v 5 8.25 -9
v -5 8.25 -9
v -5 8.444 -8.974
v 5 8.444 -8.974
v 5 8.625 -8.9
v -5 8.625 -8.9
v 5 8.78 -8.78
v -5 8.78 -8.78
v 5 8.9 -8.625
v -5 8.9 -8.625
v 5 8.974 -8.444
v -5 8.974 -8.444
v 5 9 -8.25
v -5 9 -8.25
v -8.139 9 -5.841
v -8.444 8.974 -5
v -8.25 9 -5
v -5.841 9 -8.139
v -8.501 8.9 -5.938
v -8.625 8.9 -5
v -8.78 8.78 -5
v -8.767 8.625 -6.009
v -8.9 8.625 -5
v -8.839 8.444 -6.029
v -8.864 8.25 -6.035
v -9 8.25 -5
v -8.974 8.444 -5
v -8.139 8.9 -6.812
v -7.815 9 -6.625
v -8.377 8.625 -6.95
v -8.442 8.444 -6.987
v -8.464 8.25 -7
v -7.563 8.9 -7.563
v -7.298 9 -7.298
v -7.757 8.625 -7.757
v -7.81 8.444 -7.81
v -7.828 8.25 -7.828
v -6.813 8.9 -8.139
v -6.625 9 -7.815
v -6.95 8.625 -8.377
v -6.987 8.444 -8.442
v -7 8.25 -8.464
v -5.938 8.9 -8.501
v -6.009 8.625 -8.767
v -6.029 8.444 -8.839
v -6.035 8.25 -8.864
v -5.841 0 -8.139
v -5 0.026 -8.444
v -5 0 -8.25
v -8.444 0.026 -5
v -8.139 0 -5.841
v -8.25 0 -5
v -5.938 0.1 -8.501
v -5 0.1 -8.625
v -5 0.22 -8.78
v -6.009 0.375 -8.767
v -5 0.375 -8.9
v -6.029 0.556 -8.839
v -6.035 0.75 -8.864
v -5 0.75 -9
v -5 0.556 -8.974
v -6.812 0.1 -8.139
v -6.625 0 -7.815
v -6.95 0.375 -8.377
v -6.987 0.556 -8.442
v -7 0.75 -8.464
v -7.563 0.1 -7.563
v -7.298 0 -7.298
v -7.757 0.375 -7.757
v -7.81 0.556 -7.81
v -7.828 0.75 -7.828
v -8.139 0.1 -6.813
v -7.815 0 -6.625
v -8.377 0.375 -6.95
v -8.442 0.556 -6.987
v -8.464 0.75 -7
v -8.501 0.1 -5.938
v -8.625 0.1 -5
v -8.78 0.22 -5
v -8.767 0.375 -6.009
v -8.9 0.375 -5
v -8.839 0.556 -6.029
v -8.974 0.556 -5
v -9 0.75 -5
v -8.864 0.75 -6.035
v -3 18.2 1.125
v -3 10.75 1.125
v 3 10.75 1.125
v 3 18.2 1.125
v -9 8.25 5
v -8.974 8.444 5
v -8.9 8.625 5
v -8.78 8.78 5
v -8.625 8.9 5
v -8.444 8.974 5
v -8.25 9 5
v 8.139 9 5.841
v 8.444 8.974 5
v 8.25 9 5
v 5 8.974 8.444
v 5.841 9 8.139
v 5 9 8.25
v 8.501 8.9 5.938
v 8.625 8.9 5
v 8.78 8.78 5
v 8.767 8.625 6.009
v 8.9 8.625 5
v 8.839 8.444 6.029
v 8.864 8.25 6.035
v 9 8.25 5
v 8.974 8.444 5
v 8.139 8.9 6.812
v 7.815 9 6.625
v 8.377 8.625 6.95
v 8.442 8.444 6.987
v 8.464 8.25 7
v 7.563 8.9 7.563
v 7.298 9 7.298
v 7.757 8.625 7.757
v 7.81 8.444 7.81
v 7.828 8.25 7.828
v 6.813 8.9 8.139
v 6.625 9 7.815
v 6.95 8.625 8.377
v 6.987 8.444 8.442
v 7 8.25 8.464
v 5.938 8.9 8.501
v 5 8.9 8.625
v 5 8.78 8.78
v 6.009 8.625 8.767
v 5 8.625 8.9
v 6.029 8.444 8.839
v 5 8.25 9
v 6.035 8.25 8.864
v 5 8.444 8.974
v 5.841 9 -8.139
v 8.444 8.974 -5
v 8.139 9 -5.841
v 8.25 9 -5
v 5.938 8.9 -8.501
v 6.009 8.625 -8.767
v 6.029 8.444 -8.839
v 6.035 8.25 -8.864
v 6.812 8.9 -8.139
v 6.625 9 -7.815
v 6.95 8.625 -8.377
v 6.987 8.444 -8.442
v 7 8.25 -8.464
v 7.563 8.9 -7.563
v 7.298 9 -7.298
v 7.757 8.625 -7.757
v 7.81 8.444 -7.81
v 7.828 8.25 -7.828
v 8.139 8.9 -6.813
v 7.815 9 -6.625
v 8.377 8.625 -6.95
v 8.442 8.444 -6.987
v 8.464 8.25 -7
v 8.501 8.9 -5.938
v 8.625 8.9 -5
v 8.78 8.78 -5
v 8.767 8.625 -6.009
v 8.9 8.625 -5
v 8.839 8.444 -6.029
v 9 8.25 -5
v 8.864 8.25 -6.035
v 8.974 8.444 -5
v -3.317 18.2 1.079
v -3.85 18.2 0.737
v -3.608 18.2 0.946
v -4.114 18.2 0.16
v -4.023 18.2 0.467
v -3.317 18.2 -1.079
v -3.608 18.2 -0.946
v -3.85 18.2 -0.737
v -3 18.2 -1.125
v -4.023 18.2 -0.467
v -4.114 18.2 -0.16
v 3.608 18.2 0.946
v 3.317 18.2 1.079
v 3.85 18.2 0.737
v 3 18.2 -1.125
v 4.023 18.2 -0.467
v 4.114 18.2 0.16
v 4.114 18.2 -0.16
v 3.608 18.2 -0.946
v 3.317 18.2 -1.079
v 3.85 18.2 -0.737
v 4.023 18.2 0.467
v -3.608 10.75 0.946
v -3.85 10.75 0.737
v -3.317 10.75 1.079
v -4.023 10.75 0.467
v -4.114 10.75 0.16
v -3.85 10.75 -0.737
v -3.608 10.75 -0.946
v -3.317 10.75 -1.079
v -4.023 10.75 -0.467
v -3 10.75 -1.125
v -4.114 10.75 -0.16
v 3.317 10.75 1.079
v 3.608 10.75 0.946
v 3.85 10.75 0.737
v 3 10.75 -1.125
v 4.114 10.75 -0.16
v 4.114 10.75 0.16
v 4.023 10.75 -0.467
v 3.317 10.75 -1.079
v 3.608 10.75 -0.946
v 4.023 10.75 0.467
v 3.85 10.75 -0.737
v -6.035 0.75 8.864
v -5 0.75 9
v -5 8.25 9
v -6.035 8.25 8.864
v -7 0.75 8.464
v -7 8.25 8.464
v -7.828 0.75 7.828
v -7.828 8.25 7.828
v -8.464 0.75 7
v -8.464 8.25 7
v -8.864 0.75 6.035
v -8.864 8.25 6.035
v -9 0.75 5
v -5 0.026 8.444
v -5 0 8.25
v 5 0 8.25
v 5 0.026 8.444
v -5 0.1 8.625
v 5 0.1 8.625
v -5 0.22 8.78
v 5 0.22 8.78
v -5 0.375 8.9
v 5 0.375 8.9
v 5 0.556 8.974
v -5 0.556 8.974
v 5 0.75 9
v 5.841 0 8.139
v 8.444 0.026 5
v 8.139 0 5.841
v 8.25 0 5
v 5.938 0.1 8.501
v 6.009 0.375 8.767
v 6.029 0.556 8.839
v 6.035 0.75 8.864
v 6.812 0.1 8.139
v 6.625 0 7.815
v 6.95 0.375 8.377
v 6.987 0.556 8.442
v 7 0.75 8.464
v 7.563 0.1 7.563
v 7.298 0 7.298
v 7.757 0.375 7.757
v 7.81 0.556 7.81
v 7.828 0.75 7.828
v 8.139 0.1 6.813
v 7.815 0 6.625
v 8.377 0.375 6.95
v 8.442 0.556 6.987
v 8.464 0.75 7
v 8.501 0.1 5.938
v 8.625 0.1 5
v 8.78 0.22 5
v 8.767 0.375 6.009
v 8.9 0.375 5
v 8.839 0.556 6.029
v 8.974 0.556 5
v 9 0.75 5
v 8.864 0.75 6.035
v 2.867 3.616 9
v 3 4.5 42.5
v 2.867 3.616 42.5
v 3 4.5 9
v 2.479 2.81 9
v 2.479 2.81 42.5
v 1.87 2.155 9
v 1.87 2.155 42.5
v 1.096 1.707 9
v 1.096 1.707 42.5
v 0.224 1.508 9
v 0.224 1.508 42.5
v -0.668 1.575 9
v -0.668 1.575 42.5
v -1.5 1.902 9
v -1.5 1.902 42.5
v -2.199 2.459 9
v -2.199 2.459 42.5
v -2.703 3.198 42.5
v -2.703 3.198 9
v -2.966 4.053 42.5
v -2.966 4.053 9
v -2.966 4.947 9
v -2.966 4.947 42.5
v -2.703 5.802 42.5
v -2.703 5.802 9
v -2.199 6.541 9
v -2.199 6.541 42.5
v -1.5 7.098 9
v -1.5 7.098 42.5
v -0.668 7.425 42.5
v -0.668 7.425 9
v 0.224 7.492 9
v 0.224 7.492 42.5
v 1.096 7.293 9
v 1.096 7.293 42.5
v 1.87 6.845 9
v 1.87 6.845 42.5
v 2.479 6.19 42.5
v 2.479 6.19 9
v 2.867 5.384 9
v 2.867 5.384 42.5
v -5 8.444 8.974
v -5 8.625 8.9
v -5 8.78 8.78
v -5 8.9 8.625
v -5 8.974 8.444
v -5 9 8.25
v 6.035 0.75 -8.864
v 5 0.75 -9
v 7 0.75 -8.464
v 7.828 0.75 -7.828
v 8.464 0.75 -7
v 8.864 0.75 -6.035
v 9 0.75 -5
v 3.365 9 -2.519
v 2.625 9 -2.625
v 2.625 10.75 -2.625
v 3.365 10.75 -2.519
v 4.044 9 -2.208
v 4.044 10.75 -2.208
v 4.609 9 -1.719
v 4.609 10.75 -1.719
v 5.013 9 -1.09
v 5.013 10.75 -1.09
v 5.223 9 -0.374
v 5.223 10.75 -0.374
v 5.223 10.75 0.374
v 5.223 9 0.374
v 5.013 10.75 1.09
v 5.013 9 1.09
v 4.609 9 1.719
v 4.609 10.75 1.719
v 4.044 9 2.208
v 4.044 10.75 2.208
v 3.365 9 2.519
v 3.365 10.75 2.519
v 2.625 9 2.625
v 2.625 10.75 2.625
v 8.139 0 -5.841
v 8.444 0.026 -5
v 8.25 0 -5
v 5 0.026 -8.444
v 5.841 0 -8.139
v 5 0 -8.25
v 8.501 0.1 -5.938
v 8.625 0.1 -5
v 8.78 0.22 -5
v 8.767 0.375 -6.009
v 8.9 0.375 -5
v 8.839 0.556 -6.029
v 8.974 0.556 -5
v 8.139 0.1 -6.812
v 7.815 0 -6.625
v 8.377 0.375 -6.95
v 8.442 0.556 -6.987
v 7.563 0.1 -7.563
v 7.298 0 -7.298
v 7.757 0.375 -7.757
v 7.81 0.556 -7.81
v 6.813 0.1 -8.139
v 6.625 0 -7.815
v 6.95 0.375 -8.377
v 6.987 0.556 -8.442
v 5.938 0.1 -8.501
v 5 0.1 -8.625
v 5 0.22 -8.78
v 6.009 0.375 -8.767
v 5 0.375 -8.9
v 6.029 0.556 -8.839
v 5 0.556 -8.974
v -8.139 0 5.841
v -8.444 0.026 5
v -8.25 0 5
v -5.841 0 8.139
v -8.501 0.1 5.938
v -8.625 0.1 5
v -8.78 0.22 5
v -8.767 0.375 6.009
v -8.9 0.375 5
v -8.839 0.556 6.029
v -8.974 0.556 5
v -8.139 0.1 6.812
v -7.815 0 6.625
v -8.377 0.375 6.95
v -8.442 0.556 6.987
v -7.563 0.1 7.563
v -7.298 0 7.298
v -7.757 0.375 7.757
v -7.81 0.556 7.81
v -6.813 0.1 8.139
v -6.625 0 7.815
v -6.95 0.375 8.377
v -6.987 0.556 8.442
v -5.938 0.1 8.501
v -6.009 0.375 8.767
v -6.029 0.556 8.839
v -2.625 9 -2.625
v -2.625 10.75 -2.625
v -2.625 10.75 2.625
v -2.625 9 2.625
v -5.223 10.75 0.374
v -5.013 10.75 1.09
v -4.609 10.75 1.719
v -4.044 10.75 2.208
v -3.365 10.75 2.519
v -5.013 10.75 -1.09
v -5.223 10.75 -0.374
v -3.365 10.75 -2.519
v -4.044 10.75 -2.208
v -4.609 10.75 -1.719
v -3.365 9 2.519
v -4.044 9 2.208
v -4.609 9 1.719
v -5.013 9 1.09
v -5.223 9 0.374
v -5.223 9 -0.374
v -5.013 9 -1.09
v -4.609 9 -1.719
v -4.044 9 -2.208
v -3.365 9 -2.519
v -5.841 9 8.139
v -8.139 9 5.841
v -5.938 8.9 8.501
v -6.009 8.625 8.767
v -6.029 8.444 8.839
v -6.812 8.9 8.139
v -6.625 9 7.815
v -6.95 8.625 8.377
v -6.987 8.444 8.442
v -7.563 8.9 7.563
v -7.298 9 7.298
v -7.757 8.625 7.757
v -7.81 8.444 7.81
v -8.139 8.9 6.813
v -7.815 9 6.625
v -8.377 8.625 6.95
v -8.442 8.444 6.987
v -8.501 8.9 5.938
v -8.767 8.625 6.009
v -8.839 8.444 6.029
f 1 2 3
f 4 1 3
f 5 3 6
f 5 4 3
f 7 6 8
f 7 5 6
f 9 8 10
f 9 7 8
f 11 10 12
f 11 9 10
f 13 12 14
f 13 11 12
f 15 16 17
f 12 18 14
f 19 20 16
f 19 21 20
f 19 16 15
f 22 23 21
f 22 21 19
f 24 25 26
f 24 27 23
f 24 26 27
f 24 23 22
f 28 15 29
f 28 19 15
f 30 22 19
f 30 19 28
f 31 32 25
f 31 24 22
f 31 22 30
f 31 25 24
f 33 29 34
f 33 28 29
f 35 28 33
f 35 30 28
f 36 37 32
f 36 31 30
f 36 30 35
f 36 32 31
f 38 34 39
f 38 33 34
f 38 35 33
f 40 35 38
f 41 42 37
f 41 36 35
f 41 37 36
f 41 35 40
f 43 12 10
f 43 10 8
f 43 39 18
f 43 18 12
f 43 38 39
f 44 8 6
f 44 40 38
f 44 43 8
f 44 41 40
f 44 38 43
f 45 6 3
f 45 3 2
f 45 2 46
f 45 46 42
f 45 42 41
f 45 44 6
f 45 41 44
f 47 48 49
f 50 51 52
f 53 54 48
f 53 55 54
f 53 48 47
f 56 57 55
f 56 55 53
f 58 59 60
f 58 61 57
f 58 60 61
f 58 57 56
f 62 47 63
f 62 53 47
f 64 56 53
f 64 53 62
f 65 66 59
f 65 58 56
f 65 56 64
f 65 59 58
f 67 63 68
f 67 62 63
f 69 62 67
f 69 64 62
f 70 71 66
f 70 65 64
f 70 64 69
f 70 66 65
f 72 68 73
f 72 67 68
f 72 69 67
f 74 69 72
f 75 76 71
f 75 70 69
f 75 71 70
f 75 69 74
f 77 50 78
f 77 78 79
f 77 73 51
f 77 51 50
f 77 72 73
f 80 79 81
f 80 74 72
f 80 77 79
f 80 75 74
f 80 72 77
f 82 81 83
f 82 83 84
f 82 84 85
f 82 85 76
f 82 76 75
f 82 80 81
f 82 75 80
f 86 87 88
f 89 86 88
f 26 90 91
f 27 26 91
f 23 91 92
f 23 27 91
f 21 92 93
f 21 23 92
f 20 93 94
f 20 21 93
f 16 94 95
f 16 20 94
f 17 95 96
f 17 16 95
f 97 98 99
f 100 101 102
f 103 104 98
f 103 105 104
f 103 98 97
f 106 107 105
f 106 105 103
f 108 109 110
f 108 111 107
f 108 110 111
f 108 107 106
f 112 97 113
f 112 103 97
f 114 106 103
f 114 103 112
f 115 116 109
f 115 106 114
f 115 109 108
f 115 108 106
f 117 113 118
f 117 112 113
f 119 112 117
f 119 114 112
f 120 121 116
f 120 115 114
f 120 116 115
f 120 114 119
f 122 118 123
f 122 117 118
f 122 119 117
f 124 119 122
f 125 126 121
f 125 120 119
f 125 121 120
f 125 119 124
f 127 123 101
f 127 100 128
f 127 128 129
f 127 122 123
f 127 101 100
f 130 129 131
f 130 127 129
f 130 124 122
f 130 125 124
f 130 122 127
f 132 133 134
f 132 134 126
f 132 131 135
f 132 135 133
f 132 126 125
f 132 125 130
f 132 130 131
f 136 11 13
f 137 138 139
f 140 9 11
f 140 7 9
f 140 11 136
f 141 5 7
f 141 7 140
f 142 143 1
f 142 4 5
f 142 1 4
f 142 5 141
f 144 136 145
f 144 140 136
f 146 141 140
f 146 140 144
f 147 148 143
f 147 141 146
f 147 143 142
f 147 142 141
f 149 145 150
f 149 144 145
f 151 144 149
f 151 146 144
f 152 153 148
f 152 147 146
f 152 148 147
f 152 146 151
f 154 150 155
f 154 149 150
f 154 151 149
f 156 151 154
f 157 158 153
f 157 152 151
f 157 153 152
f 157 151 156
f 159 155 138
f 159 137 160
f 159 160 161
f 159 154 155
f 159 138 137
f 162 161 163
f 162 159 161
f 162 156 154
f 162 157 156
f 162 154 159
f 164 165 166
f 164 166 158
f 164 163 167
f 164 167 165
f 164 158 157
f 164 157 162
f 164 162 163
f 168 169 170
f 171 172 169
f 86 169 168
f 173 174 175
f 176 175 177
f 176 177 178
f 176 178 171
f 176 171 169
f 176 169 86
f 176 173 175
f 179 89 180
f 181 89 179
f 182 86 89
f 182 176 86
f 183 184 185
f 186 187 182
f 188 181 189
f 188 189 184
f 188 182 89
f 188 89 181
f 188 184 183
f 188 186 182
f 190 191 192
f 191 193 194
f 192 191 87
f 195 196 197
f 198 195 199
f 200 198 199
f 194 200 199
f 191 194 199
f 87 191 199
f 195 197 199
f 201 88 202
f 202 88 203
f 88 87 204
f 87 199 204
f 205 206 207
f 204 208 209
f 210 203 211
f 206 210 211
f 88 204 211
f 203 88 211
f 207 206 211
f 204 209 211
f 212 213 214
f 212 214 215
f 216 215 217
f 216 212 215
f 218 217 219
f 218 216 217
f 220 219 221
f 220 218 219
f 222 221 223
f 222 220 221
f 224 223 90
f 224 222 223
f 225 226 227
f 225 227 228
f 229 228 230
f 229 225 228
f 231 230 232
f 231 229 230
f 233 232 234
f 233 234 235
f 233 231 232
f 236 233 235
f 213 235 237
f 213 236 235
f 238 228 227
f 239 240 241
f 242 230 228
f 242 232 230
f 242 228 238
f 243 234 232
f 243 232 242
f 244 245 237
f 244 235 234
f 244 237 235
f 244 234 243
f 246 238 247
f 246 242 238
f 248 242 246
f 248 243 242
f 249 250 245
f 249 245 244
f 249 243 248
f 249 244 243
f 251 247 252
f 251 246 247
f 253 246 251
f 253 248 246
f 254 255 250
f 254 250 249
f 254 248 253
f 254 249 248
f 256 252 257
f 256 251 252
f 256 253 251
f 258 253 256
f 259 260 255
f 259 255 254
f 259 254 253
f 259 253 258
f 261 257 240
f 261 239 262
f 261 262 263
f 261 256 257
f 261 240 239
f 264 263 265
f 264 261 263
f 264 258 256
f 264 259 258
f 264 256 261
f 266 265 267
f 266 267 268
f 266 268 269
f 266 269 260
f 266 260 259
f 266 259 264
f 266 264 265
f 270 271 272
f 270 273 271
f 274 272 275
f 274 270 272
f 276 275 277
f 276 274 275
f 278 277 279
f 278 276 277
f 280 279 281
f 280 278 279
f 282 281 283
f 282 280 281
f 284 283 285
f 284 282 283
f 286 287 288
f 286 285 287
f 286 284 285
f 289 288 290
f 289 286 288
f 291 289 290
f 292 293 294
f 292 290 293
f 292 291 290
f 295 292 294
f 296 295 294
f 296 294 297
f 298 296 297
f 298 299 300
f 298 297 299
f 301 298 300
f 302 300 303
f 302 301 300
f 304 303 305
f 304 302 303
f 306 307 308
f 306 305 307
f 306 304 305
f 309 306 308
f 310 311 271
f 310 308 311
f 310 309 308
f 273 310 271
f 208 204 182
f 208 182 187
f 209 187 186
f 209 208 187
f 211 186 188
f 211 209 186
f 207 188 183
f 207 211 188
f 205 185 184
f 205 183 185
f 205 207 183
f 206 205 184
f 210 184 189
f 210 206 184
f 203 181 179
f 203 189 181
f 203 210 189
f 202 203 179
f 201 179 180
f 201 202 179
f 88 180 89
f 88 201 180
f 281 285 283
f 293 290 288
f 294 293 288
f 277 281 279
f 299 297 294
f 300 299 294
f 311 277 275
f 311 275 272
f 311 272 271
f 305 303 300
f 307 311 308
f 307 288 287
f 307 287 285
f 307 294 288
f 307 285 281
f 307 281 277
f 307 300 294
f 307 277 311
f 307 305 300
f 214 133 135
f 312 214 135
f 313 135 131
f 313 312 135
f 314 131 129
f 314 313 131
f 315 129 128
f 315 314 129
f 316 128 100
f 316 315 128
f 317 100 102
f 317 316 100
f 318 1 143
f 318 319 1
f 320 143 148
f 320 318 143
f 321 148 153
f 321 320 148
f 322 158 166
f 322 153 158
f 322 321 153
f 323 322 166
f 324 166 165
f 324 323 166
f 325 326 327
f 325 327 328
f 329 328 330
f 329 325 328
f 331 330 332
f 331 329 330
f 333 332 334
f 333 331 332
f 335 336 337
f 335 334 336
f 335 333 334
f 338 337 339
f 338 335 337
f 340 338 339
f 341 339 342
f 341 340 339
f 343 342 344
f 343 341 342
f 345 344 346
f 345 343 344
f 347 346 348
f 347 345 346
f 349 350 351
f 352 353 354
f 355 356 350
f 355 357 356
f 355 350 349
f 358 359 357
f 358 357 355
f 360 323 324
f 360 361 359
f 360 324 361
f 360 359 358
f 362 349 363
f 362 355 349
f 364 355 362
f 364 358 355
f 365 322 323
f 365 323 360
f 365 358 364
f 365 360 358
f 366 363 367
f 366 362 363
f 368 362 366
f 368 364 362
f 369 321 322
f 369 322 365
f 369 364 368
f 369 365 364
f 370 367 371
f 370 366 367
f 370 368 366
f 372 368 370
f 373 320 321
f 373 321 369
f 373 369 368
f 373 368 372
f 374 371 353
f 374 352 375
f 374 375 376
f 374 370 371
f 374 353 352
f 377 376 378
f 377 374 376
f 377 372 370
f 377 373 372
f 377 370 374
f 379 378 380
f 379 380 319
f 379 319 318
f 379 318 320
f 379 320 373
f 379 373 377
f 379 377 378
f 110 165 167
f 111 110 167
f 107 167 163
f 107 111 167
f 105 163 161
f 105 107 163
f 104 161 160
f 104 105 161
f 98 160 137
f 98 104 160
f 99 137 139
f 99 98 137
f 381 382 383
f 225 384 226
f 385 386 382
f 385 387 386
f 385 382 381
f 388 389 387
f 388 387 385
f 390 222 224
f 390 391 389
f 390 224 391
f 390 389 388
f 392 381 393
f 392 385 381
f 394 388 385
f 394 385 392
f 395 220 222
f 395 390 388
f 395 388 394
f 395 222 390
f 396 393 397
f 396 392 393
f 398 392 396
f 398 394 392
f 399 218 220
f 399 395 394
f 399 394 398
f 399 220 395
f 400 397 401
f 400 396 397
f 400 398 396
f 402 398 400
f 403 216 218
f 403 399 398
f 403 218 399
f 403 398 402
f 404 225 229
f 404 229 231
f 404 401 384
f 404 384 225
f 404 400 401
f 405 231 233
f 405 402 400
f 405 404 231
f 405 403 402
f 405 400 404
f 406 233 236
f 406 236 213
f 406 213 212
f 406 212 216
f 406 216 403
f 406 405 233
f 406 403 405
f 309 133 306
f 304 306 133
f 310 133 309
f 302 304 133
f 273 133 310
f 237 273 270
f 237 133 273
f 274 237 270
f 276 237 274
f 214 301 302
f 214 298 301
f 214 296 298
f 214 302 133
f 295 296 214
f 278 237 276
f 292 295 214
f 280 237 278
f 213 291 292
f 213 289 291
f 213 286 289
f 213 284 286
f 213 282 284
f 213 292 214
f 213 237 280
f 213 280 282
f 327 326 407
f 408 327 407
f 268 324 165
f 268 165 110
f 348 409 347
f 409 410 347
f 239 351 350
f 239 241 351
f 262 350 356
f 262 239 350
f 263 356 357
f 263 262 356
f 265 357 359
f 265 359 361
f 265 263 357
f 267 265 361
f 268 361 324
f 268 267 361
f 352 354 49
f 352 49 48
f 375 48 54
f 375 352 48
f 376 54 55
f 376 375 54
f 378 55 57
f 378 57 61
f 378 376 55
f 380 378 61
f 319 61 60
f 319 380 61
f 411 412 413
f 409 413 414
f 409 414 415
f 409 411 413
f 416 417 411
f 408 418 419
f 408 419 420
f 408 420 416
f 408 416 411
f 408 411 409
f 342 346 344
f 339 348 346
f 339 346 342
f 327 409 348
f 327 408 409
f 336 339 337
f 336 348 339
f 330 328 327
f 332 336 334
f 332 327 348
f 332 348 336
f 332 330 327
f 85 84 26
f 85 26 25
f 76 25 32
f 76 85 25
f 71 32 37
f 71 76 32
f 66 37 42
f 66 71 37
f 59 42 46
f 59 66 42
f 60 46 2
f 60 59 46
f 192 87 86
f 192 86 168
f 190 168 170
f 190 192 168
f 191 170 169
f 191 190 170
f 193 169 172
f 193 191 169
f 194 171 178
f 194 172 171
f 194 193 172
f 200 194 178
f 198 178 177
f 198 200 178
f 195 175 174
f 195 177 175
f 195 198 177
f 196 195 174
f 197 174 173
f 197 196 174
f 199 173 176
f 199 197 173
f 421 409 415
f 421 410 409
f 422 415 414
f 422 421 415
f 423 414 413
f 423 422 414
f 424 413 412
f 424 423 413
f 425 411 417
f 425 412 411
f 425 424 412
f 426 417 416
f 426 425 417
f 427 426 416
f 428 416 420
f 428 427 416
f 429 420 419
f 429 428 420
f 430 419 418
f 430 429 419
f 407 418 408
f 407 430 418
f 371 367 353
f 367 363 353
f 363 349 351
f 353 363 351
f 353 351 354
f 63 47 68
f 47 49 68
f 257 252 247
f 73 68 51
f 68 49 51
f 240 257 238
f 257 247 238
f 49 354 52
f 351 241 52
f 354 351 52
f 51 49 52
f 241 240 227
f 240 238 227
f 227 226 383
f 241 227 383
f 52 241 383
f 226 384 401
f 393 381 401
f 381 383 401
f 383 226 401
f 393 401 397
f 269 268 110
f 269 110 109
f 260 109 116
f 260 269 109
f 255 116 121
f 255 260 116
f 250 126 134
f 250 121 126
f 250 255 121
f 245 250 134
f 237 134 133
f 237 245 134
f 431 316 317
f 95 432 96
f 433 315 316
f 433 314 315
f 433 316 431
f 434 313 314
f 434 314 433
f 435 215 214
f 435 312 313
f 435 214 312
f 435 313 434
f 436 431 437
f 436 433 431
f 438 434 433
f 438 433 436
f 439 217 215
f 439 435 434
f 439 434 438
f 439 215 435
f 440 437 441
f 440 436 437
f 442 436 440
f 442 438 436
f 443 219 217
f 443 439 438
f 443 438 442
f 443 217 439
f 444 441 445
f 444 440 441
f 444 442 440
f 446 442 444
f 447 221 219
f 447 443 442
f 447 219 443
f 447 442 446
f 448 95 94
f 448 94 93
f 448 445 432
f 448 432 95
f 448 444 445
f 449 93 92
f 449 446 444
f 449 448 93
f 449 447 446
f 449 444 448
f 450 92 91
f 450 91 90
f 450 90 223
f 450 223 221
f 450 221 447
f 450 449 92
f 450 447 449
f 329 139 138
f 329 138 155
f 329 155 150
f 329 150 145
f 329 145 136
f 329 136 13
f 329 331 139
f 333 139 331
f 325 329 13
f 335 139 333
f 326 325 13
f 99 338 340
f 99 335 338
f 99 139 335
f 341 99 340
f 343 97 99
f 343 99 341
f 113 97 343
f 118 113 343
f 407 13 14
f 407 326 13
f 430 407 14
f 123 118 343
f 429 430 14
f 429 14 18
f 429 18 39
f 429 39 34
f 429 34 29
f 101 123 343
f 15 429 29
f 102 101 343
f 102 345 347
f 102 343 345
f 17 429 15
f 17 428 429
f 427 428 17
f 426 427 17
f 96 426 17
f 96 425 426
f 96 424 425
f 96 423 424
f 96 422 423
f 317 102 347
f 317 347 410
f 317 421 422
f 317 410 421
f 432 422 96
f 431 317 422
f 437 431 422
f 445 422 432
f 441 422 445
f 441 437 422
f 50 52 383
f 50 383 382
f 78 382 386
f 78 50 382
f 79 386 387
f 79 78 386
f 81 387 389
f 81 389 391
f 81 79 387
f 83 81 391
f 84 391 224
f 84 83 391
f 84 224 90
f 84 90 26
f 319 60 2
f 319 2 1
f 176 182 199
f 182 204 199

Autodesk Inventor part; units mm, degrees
ref_plane "YZ Plane" through (0, 0, 0) normal (1, 0, 0) x (0, 1, 0)
ref_plane "XZ Plane" through (0, 0, 0) normal (0, 1, 0) x (-1, 0, 0)
ref_plane "XY Plane" through (0, 0, 0) normal (0, 0, 1) x (1, 0, 0)
sketch "Sketch1" plane through (0, 0, 0) normal (0, 1, 0) x (-1, 0, 0)
  line L0 (-9, 9) -> (9, 9)
  line L1 (9, 9) -> (9, -9)
  line L2 (9, -9) -> (-9, -9)
  line L3 (-9, -9) -> (-9, 9)
  line L4 (-9, 9) -> (9, -9) construction
  line L5 (9, 9) -> (-9, -9) construction
  point P0 (0, 0)
  dimension "d0" = 18
  dimension "d1" = 18
extrude "Extrusion1" add sketch "Sketch1" along normal blind 9
fillet "Fillet1" radius 0.75 8 edges at (0, 9, 9) (9, 9, 0) (0, 9, -9) (-9, 9, 0) (0, 0, 9) (-9, 0, 0) (0, 0, -9) (9, 0, 0)
fillet "Fillet2" radius 4 12 edges at (-8.7803, 8.7803, 8.7803) (-8.7803, 0.2197, 8.7803) (-9, 4.5, 9) (8.7803, 8.7803, 8.7803) (8.7803, 0.2197, 8.7803) (9, 4.5, 9) (8.7803, 8.7803, -8.7803) (8.7803, 0.2197, -8.7803) (9, 4.5, -9) (-8.7803, 8.7803, -8.7803) (-8.7803, 0.2197, -8.7803) (-9, 4.5, -9)
sketch "Sketch2" plane through (0, 9, 0) normal (0, 1, 0) x (1, 0, 0)
  line L0 (0, 0) -> (-5.25, 0) construction
  line L1 (-5.25, 0) -> (5.25, 0) construction
  line L2 (-2.625, -2.625) -> (2.625, -2.625)
  line L3 (2.625, 2.625) -> (-2.625, 2.625)
  arc A0 (-2.625, 2.625) -> (-2.625, -2.625) centre (-2.625, 0) ccw
  arc A1 (2.625, -2.625) -> (2.625, 2.625) centre (2.625, 0) ccw
  dimension "d6" = 5.25
  dimension "d7" = 10.5
  dimension "d8" = 5.25
extrude "Extrusion2" add sketch "Sketch2" along normal blind 1.75
sketch "Sketch3" plane through (0, 10.75, 0) normal (0, 1, 0) x (1, 0, 0)
  line L0 (0, 0) -> (-4.125, 0) construction
  line L1 (-4.125, 0) -> (4.125, 0) construction
  line L2 (-3, -1.125) -> (3, -1.125)
  line L3 (3, 1.125) -> (-3, 1.125)
  arc A0 (-3, 1.125) -> (-3, -1.125) centre (-3, 0) ccw
  arc A1 (3, -1.125) -> (3, 1.125) centre (3, 0) ccw
  dimension "d11" = 4.125
  dimension "d12" = 8.25
  dimension "d13" = 2.25
extrude "Extrusion3" add sketch "Sketch3" along normal blind 7.45 separate body
sketch "Sketch4" plane through (-5, 8.25, 9) normal (0, 0, 1) x (1, 0, 0)
  line L0 (10, 0) -> (10, -7.5) construction
  line L1 (0, 0) -> (10, 0) construction
  line L2 (0, -7.5) -> (0, 0) construction
  line L3 (10, -7.5) -> (0, -7.5) construction
  line L4 (10, -7.5) -> (0, -7.5) construction
  line L5 (5, -7.5) -> (5, 0) construction
  circle A0 centre (5, -3.75) radius 3
  point P0 (5, -8.25)
  dimension "d16" = 6
extrude "Extrusion4" add sketch "Sketch4" along normal blind 33.5 bodies 1
equation "\"d7\" = 2 * d6"
equation "\"d8\" = d6"
properties part number "USB C Right Angle Plug"
